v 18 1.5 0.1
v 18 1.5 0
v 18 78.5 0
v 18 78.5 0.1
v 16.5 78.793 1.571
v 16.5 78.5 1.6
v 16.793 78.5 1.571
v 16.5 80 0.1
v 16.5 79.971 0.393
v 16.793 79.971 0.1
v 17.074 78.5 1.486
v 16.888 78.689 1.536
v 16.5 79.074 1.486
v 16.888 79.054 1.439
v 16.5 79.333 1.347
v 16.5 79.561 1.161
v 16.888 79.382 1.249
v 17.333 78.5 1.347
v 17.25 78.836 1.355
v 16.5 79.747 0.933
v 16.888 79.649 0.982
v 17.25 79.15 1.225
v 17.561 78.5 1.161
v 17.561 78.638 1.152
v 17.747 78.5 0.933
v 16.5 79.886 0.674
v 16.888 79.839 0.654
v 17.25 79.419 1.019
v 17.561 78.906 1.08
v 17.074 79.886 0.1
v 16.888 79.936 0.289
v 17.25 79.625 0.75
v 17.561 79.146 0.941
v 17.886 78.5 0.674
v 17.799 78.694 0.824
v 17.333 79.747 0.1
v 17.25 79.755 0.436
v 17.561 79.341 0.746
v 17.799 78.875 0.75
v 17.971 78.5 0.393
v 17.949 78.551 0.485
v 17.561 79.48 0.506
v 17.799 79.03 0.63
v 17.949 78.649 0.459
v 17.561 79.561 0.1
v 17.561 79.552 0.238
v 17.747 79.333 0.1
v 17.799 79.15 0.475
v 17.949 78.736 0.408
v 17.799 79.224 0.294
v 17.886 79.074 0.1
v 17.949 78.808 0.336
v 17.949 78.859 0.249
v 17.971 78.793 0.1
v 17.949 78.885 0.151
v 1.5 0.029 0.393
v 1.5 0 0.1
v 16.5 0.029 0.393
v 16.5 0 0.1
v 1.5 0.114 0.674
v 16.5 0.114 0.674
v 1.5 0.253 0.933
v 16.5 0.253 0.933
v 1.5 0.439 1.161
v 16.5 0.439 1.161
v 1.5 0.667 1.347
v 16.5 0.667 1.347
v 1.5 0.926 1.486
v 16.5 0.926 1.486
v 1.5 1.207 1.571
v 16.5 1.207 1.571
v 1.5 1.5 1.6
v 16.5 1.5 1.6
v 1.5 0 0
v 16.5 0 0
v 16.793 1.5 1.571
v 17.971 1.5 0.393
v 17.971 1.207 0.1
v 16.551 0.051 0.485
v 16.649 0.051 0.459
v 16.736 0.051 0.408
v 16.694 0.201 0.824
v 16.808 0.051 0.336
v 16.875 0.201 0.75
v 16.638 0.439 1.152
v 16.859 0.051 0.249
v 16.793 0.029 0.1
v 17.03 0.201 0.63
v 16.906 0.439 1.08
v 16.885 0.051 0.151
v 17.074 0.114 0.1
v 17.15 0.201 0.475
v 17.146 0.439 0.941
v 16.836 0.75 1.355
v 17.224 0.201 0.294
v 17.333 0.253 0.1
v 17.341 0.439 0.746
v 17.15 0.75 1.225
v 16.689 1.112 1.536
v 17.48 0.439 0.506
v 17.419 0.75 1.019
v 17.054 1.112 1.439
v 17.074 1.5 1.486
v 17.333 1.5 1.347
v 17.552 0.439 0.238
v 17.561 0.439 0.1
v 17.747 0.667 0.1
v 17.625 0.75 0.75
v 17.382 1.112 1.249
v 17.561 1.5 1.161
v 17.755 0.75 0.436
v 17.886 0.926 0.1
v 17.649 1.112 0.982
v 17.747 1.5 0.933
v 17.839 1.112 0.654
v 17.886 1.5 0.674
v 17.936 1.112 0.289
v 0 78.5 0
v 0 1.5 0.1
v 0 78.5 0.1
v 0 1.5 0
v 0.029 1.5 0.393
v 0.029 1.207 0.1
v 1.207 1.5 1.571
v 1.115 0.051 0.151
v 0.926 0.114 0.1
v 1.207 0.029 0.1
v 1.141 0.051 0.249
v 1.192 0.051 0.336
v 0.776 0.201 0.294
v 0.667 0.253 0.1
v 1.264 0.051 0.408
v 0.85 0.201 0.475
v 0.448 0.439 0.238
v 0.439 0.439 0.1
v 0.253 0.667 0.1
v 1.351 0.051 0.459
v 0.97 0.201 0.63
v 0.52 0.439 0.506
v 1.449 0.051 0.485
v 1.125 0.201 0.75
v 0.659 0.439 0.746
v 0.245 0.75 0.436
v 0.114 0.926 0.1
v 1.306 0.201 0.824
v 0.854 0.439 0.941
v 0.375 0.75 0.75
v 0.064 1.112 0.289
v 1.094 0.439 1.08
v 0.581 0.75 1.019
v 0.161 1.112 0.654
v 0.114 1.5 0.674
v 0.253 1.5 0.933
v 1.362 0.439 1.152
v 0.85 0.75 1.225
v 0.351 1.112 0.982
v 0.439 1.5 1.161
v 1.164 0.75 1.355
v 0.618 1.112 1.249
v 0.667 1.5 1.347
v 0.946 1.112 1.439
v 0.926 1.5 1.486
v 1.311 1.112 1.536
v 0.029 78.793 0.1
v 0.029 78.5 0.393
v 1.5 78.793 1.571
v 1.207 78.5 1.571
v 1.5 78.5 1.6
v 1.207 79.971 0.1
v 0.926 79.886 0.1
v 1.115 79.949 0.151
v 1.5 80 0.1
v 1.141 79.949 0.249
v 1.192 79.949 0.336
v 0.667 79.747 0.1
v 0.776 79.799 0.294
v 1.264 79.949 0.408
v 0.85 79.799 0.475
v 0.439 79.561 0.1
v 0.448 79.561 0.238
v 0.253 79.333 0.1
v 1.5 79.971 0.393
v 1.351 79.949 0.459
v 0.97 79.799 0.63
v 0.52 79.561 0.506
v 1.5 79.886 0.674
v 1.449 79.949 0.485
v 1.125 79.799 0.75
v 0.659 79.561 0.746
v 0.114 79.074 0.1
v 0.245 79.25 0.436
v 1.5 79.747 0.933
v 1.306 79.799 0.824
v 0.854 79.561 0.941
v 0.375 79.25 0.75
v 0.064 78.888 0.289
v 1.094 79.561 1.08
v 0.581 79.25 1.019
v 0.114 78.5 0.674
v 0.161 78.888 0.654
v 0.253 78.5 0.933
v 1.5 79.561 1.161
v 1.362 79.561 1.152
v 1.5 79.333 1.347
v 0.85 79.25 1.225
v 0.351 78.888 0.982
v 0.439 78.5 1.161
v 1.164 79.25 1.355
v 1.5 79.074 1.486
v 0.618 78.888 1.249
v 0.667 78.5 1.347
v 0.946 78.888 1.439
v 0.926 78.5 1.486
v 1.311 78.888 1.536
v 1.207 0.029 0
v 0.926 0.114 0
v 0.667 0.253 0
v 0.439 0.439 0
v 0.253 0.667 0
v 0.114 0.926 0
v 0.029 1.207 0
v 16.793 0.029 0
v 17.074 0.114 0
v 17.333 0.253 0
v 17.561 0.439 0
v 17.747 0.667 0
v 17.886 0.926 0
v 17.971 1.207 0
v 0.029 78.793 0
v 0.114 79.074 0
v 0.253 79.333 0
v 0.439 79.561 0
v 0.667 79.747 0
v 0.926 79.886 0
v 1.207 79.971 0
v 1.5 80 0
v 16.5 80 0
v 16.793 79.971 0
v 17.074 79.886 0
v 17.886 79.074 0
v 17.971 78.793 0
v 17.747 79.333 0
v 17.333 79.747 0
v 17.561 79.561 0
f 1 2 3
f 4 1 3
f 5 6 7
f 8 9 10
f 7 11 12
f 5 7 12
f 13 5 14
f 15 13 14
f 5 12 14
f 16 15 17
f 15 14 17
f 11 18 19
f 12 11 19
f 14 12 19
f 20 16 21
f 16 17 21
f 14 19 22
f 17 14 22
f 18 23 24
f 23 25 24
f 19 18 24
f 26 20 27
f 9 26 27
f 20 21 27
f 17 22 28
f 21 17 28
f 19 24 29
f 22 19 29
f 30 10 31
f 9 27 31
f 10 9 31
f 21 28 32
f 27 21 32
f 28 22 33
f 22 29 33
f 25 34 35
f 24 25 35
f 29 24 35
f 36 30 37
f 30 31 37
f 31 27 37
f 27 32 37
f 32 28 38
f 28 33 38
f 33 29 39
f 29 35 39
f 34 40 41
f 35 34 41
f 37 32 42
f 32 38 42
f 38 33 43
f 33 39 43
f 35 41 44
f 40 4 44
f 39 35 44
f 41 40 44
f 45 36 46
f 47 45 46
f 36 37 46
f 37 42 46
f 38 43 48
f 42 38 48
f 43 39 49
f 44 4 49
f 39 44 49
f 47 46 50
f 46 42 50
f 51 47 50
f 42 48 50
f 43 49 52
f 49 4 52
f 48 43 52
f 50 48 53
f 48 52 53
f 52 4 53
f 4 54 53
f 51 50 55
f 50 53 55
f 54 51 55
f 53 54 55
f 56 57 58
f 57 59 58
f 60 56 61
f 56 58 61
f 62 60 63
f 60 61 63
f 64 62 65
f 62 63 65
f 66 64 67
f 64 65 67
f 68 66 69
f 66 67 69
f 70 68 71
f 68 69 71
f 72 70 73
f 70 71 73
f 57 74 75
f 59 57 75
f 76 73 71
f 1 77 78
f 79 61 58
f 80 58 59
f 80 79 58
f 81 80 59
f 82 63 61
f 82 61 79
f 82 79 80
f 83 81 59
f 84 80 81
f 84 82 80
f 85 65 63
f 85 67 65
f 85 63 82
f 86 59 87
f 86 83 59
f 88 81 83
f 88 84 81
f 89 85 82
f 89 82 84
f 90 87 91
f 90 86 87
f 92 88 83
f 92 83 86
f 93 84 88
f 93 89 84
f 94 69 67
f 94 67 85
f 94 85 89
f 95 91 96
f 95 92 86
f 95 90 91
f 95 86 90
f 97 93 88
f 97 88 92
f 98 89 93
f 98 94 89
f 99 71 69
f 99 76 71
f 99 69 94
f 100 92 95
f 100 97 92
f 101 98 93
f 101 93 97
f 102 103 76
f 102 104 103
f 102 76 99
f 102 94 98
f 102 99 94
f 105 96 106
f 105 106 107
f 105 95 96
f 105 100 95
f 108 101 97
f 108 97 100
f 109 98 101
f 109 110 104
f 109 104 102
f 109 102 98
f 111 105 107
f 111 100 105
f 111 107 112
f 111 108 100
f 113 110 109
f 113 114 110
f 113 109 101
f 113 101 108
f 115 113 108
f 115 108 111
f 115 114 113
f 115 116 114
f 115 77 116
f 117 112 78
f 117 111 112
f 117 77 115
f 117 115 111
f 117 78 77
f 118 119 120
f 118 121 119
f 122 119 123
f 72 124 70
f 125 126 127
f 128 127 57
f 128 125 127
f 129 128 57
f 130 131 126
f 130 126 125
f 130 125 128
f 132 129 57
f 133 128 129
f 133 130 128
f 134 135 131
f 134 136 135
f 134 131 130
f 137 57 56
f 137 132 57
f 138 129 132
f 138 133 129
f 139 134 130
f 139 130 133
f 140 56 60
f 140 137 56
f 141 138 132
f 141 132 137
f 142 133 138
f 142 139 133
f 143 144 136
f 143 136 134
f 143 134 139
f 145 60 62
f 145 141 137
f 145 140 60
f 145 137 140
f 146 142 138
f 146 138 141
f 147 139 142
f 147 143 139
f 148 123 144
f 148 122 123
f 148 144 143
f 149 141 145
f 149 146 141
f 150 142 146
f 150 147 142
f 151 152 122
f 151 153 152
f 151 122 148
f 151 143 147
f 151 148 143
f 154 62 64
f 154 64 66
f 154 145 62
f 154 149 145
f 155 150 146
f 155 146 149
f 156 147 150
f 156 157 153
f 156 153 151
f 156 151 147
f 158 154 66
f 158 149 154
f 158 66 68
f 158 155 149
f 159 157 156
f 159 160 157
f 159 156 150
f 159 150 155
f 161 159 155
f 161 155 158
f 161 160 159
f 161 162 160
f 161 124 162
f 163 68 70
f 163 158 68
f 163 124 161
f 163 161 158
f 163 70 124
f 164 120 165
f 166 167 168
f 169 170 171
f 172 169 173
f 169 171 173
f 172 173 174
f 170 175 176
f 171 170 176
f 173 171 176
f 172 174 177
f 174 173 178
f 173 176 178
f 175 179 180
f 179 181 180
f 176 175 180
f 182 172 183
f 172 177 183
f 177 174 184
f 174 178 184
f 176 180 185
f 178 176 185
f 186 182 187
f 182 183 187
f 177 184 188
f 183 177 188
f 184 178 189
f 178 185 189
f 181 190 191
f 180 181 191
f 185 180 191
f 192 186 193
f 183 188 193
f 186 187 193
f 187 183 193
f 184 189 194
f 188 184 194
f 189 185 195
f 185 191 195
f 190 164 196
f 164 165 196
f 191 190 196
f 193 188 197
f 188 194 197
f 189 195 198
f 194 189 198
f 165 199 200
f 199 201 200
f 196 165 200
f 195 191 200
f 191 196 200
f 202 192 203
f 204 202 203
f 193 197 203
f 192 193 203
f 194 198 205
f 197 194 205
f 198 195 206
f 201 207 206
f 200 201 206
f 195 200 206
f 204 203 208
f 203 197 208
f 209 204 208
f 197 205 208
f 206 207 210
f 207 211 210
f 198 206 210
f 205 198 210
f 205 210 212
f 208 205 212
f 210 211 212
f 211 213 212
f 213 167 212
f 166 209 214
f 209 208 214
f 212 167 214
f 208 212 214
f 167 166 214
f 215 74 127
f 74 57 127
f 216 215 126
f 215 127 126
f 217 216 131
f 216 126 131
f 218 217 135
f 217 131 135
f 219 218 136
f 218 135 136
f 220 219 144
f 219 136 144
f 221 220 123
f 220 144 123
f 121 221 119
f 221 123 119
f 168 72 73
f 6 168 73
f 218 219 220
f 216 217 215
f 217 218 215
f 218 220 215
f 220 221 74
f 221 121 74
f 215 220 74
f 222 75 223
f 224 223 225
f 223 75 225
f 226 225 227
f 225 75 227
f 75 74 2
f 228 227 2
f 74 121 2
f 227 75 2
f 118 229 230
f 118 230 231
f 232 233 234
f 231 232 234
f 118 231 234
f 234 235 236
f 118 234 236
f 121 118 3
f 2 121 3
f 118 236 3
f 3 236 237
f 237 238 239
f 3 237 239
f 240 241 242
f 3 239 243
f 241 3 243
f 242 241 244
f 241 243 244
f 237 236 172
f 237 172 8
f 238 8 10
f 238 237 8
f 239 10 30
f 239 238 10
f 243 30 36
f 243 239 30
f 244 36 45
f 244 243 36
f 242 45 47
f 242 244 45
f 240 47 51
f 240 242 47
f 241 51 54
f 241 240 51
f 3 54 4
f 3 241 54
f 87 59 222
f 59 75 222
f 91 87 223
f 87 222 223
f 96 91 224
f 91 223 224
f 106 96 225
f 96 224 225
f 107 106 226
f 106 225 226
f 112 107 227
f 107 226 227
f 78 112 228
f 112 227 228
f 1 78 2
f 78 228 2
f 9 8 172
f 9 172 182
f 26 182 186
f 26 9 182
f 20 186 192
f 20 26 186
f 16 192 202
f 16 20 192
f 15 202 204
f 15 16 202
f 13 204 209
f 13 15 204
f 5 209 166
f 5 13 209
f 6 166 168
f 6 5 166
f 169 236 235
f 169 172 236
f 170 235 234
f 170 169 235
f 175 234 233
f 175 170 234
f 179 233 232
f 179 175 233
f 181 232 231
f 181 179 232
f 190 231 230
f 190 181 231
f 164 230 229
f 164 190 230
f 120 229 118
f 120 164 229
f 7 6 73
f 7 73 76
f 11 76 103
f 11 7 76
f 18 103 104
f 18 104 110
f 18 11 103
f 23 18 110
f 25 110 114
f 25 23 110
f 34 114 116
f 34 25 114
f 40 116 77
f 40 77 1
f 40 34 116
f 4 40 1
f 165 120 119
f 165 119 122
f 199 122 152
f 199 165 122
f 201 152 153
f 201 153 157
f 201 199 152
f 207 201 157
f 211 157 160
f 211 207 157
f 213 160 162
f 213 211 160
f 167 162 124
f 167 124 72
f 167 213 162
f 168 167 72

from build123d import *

# Parameters (mm, degrees)
SKETCH_W    = 18
SKETCH_H    = 80
PAD_DEPTH   = 1.6
FILLET_R    = 1.5
FILLET001_R = 1.5
FILLET002_R = 1.5
FILLET003_R = 1.5


with BuildPart() as part:
    # Sketch → Pad (new body)
    with BuildSketch(Plane.XY):
        with Locations((9, 40)):
            Rectangle(SKETCH_W, SKETCH_H)
    extrude(amount=PAD_DEPTH)

    # Fillet
    fillet_edges = [part.edges().sort_by_distance(p)[0] for p in [
        (0, 40, 1.6),
    ]]
    fillet(fillet_edges, radius=FILLET_R)

    # Fillet001
    fillet001_edges = [part.edges().sort_by_distance(p)[0] for p in [
        (9.75, 80, 1.6),
    ]]
    fillet(fillet001_edges, radius=FILLET001_R)

    # Fillet002
    fillet002_edges = [part.edges().sort_by_distance(p)[0] for p in [
        (18, 39.25, 1.6),
    ]]
    fillet(fillet002_edges, radius=FILLET002_R)

    # Fillet003
    fillet003_edges = [part.edges().sort_by_distance(p)[0] for p in [
        (9, 0, 1.6),
    ]]
    fillet(fillet003_edges, radius=FILLET003_R)


solid = part.part
